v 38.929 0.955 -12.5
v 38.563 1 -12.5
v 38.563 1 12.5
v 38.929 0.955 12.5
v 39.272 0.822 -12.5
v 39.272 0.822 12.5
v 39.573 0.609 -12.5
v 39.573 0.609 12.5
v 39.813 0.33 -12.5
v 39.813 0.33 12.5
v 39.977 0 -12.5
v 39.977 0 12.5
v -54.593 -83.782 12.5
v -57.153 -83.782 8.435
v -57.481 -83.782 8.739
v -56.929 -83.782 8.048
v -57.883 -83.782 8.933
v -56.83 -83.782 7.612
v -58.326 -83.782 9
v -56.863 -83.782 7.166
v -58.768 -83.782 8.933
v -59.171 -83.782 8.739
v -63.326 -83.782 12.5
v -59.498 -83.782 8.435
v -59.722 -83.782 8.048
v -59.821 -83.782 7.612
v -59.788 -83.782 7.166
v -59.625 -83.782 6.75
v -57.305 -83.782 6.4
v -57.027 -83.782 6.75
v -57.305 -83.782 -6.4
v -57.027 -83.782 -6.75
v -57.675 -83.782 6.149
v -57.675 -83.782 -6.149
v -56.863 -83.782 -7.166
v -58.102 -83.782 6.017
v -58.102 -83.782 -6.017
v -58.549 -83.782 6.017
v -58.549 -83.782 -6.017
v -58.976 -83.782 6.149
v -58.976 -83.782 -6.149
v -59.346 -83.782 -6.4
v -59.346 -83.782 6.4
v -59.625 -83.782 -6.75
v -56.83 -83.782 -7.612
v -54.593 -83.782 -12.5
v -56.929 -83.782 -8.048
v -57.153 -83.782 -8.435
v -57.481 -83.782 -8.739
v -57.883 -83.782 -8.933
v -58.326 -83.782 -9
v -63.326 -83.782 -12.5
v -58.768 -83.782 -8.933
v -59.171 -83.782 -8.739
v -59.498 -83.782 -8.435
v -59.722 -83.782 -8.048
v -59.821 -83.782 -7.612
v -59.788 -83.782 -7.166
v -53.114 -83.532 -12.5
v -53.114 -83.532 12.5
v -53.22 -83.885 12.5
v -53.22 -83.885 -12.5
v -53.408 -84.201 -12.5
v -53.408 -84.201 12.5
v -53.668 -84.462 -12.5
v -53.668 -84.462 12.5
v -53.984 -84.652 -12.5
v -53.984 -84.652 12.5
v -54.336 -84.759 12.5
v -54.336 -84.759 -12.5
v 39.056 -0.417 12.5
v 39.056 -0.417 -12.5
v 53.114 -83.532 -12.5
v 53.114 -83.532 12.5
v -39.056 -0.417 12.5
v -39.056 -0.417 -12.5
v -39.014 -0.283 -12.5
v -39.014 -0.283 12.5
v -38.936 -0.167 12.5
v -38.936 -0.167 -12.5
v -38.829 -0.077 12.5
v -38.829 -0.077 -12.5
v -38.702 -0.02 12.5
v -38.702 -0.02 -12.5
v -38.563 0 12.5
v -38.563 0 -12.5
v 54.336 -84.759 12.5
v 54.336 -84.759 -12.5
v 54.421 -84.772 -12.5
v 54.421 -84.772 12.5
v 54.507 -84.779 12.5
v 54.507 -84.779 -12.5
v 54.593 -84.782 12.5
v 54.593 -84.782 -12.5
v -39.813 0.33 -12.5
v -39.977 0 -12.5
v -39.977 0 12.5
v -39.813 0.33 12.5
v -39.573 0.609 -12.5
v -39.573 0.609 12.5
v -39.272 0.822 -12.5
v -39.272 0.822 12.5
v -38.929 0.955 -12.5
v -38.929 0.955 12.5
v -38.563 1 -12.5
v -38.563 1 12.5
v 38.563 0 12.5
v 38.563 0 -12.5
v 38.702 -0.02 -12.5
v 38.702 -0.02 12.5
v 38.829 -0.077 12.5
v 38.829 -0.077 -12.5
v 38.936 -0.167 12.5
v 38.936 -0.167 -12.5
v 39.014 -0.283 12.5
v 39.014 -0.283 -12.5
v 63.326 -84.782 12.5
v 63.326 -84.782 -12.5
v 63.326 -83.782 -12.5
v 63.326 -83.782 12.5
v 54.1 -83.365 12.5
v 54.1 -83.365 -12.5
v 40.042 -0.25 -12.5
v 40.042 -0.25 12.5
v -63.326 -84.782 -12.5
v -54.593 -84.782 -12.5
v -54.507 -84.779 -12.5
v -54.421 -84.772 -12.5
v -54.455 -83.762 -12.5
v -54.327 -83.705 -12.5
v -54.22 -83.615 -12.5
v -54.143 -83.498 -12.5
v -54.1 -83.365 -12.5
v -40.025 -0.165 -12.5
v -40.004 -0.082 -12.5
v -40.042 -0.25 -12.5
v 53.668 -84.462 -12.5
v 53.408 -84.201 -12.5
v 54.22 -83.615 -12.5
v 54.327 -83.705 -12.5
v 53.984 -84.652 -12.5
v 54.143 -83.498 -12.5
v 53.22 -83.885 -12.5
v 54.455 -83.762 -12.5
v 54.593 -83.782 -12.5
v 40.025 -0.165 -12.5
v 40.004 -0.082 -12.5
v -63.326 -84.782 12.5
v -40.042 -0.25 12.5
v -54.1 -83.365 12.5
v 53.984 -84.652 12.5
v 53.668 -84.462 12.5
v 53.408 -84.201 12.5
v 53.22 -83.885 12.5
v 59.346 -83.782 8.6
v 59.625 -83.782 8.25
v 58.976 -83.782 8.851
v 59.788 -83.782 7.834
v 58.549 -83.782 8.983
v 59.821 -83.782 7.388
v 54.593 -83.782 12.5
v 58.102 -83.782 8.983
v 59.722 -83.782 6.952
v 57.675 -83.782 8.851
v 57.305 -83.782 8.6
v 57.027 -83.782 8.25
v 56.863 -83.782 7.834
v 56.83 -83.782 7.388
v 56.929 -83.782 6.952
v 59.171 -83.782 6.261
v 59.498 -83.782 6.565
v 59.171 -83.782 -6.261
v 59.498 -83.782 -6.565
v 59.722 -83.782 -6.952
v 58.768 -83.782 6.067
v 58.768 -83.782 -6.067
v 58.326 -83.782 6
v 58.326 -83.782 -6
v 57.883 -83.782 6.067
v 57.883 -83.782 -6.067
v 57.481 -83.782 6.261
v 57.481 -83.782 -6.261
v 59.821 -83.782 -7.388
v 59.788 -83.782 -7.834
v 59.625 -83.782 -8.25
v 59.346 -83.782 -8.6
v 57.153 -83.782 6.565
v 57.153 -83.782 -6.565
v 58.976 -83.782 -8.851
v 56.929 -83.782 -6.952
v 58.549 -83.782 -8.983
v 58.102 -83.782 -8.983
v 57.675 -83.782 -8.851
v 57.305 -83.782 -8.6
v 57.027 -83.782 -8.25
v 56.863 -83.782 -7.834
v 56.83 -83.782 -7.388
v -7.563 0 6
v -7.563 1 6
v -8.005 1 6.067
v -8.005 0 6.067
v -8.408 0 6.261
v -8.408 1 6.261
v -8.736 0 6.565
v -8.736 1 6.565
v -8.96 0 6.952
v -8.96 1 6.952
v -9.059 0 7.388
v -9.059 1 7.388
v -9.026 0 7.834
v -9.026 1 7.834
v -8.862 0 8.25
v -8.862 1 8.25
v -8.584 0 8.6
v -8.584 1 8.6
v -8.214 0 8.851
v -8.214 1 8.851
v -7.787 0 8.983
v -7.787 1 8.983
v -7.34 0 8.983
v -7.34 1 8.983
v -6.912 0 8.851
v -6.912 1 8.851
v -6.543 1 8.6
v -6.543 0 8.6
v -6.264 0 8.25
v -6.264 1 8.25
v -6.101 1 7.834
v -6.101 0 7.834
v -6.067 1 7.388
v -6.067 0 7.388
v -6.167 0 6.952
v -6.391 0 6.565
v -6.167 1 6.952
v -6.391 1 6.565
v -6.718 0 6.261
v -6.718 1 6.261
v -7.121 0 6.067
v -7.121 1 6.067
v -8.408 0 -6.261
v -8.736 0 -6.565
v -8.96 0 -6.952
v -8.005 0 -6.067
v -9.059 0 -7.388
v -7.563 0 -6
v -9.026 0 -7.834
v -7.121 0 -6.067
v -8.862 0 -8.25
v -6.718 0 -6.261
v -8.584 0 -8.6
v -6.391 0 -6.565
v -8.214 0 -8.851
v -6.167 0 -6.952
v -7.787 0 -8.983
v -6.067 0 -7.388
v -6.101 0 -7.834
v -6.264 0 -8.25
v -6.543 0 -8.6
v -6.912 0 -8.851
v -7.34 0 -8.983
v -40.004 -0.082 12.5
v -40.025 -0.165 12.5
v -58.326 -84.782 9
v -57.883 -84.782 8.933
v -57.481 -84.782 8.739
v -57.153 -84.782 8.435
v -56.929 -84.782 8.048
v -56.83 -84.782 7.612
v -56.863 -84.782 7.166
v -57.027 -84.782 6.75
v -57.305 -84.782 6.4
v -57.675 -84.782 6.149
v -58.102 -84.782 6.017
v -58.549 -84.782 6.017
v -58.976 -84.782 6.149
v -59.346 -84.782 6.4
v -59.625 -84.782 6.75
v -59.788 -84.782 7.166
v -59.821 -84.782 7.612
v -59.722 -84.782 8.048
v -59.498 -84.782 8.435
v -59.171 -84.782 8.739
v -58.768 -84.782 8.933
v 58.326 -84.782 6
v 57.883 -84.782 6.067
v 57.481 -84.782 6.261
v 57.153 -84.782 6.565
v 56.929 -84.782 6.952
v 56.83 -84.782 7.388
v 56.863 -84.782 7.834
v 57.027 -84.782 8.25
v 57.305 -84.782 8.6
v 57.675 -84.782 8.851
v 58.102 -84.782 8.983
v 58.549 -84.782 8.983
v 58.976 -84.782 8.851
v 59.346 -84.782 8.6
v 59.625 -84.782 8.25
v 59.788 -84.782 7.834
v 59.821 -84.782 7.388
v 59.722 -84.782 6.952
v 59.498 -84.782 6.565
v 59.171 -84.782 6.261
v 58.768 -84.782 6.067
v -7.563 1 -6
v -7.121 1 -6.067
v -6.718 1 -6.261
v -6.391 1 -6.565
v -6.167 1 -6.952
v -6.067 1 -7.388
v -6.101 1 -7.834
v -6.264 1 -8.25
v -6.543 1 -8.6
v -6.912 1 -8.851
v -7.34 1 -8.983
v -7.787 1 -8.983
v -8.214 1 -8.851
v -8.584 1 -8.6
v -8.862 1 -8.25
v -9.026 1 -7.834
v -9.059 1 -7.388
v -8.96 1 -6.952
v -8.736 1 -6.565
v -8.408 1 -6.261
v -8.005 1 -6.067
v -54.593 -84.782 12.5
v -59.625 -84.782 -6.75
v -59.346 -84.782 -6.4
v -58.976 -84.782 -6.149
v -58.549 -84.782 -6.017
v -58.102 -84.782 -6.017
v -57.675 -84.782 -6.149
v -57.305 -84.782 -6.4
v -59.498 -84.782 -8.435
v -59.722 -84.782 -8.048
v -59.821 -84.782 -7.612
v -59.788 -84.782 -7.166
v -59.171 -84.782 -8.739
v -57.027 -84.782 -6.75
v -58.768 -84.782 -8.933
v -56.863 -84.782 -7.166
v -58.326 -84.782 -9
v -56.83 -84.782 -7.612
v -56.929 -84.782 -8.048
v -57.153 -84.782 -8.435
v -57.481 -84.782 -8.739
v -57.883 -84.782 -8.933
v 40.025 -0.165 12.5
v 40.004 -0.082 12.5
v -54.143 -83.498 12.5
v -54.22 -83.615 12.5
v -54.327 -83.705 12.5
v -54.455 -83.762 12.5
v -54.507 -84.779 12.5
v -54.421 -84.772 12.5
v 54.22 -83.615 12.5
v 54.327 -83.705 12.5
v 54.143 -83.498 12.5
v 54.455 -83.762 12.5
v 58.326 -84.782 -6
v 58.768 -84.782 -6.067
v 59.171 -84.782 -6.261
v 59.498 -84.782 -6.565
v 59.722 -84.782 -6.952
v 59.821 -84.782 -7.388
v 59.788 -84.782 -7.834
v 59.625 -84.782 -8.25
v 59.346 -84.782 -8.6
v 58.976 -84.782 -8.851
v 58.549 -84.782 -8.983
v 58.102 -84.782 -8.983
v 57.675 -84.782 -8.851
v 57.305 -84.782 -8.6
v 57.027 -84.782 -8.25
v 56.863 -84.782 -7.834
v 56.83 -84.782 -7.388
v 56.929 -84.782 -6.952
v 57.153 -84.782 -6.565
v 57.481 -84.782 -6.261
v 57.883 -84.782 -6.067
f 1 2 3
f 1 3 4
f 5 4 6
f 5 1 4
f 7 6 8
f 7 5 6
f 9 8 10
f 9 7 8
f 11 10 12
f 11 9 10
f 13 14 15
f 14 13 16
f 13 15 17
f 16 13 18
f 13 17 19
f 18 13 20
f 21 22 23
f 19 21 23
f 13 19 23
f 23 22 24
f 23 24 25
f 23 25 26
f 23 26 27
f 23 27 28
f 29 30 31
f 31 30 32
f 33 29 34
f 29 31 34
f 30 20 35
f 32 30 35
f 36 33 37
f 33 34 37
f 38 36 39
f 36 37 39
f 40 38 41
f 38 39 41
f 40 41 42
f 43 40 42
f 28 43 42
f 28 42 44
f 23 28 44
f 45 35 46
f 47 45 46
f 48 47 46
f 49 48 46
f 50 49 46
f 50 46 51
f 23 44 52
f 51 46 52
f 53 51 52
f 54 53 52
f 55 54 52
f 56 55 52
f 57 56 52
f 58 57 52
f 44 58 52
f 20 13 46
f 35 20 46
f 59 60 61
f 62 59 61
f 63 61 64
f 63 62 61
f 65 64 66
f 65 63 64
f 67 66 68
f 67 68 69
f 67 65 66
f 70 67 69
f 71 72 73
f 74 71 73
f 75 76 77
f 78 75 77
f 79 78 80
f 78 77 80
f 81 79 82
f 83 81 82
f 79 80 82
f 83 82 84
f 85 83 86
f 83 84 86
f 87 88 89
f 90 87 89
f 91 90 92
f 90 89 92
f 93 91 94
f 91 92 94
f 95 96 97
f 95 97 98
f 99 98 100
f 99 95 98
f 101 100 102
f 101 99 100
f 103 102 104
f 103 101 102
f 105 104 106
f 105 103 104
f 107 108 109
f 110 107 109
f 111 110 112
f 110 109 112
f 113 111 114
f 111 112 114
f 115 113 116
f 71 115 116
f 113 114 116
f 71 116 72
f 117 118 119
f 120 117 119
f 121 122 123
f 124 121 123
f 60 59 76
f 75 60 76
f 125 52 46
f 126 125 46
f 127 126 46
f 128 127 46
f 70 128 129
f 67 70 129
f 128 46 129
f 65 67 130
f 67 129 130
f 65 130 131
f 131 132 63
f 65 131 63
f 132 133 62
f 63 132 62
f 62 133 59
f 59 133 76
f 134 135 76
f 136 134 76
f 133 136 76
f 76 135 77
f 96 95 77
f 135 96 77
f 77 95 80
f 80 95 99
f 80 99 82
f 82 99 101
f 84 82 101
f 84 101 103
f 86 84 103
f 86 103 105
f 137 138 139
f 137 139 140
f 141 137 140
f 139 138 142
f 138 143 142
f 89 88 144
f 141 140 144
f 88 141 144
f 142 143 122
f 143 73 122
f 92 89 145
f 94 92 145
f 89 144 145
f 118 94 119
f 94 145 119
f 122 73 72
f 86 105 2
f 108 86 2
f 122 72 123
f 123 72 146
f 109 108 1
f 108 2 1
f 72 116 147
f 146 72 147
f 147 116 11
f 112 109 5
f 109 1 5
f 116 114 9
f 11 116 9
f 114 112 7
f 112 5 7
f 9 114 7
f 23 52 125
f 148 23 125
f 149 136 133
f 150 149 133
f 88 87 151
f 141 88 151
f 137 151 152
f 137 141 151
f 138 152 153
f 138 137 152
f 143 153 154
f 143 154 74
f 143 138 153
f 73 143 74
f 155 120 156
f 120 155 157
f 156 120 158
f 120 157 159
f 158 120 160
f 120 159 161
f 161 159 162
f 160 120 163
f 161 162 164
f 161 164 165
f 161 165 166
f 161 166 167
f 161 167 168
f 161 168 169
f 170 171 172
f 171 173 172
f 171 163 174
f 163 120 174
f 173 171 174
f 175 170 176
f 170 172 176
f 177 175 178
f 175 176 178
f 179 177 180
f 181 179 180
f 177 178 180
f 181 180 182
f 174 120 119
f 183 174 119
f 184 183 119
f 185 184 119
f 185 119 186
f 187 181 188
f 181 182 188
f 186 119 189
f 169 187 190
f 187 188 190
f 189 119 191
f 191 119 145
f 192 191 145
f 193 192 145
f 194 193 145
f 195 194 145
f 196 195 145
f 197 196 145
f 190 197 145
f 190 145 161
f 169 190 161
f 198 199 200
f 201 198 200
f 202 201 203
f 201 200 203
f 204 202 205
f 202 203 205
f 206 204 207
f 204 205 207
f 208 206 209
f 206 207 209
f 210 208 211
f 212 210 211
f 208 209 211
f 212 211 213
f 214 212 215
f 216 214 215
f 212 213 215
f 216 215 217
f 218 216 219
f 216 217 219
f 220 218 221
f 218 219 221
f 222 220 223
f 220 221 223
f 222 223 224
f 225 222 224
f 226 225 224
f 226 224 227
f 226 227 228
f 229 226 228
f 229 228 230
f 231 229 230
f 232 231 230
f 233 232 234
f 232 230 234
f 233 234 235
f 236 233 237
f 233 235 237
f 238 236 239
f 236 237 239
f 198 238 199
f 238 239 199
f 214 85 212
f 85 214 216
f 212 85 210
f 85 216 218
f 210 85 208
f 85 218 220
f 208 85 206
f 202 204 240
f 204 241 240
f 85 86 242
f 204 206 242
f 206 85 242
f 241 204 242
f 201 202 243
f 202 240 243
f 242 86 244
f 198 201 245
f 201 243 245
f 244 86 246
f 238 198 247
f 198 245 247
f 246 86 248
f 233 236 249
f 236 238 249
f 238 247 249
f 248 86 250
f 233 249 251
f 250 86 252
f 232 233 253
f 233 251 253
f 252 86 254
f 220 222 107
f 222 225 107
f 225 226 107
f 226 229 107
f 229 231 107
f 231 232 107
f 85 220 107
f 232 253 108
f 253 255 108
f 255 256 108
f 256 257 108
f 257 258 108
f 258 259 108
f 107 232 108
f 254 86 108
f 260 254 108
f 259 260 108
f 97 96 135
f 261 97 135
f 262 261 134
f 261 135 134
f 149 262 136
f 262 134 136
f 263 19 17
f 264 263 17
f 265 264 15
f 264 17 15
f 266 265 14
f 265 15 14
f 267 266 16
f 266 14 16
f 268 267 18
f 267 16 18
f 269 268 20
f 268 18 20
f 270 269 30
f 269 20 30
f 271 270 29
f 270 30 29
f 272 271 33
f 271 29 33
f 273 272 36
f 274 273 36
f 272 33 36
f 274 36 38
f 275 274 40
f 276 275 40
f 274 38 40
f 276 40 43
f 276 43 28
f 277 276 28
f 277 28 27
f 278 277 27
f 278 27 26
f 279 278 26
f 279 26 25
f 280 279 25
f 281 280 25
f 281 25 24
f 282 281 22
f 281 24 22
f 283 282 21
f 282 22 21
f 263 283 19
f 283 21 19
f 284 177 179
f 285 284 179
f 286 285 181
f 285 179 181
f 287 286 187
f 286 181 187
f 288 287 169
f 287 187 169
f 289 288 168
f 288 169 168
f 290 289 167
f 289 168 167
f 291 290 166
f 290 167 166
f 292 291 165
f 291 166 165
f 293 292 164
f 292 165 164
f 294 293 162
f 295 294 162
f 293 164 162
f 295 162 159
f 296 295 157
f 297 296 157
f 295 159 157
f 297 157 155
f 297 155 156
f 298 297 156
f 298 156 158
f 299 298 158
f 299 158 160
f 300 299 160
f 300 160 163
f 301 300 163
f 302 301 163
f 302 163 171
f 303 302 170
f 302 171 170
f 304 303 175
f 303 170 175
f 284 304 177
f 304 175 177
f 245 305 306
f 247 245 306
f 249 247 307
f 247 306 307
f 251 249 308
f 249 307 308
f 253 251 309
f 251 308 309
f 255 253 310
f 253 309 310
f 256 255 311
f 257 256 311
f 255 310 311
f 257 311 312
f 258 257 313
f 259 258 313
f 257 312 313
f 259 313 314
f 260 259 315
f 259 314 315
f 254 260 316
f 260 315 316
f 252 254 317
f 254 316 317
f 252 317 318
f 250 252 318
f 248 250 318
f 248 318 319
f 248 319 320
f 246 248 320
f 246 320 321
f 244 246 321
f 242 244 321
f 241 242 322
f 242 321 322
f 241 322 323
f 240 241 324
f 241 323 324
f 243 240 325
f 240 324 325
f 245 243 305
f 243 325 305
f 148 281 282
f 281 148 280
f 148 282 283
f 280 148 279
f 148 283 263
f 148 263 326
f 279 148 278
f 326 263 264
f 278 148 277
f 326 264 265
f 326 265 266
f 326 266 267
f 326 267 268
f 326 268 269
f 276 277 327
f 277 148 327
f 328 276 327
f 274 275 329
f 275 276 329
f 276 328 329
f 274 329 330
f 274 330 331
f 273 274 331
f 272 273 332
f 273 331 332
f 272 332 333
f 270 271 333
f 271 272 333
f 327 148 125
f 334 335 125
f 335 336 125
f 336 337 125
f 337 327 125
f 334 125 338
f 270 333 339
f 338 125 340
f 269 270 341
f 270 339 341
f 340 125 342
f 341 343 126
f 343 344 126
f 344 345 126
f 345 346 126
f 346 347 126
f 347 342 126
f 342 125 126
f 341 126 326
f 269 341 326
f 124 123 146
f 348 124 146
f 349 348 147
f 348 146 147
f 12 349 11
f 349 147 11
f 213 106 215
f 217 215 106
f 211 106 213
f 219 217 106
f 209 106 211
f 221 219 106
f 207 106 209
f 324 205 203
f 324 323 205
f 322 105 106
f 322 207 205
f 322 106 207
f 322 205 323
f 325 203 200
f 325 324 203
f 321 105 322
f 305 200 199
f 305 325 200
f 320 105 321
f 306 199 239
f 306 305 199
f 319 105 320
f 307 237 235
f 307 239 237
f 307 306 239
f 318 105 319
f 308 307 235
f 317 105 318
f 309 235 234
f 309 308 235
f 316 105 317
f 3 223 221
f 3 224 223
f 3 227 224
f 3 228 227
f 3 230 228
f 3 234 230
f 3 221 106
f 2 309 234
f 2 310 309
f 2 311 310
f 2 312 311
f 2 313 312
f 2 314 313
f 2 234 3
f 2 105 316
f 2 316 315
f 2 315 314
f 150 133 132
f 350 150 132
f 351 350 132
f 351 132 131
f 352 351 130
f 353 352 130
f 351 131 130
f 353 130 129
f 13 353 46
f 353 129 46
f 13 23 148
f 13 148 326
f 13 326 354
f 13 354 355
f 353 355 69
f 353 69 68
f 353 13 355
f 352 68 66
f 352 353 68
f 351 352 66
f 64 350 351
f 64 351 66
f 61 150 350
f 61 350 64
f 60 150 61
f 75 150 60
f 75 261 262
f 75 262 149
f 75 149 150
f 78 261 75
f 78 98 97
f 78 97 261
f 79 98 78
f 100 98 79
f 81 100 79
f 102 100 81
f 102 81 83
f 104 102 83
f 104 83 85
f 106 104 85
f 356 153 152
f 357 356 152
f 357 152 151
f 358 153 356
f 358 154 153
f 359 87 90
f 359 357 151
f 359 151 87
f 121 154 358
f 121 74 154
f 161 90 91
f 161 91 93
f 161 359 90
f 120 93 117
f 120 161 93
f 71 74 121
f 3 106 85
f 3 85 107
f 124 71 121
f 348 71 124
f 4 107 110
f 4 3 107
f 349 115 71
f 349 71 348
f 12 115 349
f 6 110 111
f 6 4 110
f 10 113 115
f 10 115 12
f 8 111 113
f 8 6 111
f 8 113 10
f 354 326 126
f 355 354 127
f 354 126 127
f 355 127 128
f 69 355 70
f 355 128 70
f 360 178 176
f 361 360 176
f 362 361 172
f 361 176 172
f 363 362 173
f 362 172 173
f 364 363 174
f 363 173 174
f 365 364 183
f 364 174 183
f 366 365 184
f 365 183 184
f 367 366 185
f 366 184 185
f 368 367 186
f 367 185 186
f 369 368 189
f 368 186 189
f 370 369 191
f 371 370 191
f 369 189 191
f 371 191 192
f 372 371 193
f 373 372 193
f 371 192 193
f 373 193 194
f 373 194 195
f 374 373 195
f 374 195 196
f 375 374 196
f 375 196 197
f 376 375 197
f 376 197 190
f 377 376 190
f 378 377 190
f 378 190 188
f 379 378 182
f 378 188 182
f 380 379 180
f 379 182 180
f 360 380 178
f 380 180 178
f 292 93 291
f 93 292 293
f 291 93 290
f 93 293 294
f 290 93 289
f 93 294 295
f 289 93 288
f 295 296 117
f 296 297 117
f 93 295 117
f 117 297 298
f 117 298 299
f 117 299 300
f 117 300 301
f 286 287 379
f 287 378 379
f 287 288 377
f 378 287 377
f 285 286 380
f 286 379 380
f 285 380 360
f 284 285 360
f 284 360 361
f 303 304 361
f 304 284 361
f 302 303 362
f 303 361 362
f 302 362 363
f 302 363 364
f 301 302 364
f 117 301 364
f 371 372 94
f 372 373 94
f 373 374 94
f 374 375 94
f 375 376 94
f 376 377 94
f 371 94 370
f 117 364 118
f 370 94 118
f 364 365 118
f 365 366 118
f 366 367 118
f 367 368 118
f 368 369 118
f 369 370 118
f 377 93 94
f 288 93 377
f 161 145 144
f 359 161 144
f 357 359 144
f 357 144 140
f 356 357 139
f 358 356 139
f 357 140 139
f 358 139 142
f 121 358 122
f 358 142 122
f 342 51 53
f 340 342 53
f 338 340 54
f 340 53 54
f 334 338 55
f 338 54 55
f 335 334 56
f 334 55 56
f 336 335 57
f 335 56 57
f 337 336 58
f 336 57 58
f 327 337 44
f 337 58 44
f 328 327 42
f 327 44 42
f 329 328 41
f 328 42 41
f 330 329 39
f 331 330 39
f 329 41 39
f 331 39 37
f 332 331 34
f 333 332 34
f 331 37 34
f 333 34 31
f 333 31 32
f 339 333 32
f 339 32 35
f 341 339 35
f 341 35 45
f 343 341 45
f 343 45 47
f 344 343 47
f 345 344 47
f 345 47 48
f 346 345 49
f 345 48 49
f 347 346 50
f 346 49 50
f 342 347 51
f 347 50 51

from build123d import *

# Parameters (mm, degrees)
SKETCH_1_W               = 80
SKETCH_1_H               = 25
EXTRUDE_1_DEPTH          = 1
SM_START                 = -12.5
SM_EDGE_FLANGE_1_DEPTH   = 25
SM_EDGE_FLANGE_1_2_DEPTH = 25
SM_EDGE_FLANGE_2_DEPTH   = 25
SM_EDGE_FLANGE_2_2_DEPTH = 25
SKETCH_18_R              = 1.5
CUT_EXTRUDE_1_DEPTH      = 1
SKETCH_19_R              = 1.5
CUT_EXTRUDE_2_DEPTH      = 1


# Read off the part's stored shape, not the designer's step: Ребро-кромка1, Ребро-кромка2
with BuildPart() as part:
    # Sketch 1 → Бобышка-Вытянуть1 (new body)
    with BuildSketch(Plane(origin=(0, 0, 0), x_dir=(1, 0, 0), z_dir=(0, 1, 0))):
        Rectangle(SKETCH_1_W, SKETCH_1_H)
    extrude(amount=EXTRUDE_1_DEPTH)

    # Ребро-кромка1 outline → Ребро-кромка1 (cut)
    with BuildSketch(Plane.XY.offset(SM_START)):
        with BuildLine():
            Line((-40, 0), (-39.977477944, 0))
            ThreePointArc((-39.977477944, 0), (-39.429289785, 0.724744872), (-38.563264381, 1))
            Line((-38.563264381, 1), (-40, 1))
            Line((-40, 1), (-40, 0))
        make_face()
        with BuildLine():
            Line((40, 1), (38.563264381, 1))
            ThreePointArc((38.563264381, 1), (39.429289785, 0.724744872), (39.977477944, 0))
            Line((39.977477944, 0), (40, 0))
            Line((40, 0), (40, 1))
        make_face()
    extrude(amount=SM_EDGE_FLANGE_1_DEPTH, mode=Mode.SUBTRACT)

    # Sm Edge Flange 1 2 outline → Sm Edge Flange 1 2 (add)
    with BuildSketch(Plane.XY.offset(SM_START)):
        with BuildLine():
            ThreePointArc((-39.977477944, 0), (-40.015252138, -0.123527486), (-40.042258437, -0.24984688))
            Line((-40.042258437, -0.24984688), (-54.339743625, -84.781655225))
            Line((-54.339743625, -84.781655225), (-53.353747587, -84.948423972))
            Line((-53.353747587, -84.948423972), (-39.0562624, -0.416615627))
            ThreePointArc((-39.0562624, -0.416615627), (-38.885993225, -0.118101986), (-38.563264381, 0))
            Line((-38.563264381, 0), (-39.977477944, 0))
        make_face()
        with BuildLine():
            Line((39.977477944, 0), (38.563264381, 0))
            ThreePointArc((38.563264381, 0), (38.885993225, -0.118101986), (39.0562624, -0.416615627))
            Line((39.0562624, -0.416615627), (53.353747587, -84.948423972))
            Line((53.353747587, -84.948423972), (54.339743625, -84.781655225))
            Line((54.339743625, -84.781655225), (40.042258437, -0.24984688))
            ThreePointArc((40.042258437, -0.24984688), (40.015252138, -0.123527486), (39.977477944, 0))
        make_face()
    extrude(amount=SM_EDGE_FLANGE_1_2_DEPTH)

    # Ребро-кромка2 outline → Ребро-кромка2 (cut)
    with BuildSketch(Plane.XY.offset(SM_START)):
        with BuildLine():
            Line((54.339743625, -84.781655225), (54.33598765, -84.759448567))
            ThreePointArc((54.33598765, -84.759448567), (53.529971426, -84.339802009), (53.114144989, -83.531808345))
            Line((53.114144989, -83.531808345), (53.353747587, -84.948423972))
            Line((53.353747587, -84.948423972), (54.339743625, -84.781655225))
        make_face()
        with BuildLine():
            ThreePointArc((-53.114144989, -83.531808345), (-53.529971426, -84.339802009), (-54.33598765, -84.759448567))
            Line((-54.33598765, -84.759448567), (-54.339743625, -84.781655225))
            Line((-54.339743625, -84.781655225), (-53.353747587, -84.948423972))
            Line((-53.353747587, -84.948423972), (-53.114144989, -83.531808345))
        make_face()
    extrude(amount=SM_EDGE_FLANGE_2_DEPTH, mode=Mode.SUBTRACT)

    # Sm Edge Flange 2 2 outline → Sm Edge Flange 2 2 (add)
    with BuildSketch(Plane.XY.offset(SM_START)):
        with BuildLine():
            ThreePointArc((54.33598765, -84.759448567), (54.464084816, -84.776093249), (54.593139045, -84.781655225))
            Line((54.593139045, -84.781655225), (63.325540765, -84.781655225))
            Line((63.325540765, -84.781655225), (63.325540765, -83.781655225))
            Line((63.325540765, -83.781655225), (54.593139045, -83.781655225))
            ThreePointArc((54.593139045, -83.781655225), (54.270410201, -83.663553239), (54.100141026, -83.365039598))
            Line((54.100141026, -83.365039598), (54.33598765, -84.759448567))
        make_face()
        with BuildLine():
            Line((-63.325540765, -83.781655225), (-63.325540765, -84.781655225))
            Line((-63.325540765, -84.781655225), (-54.593139045, -84.781655225))
            ThreePointArc((-54.593139045, -84.781655225), (-54.464084816, -84.776093249), (-54.33598765, -84.759448567))
            Line((-54.33598765, -84.759448567), (-54.100141026, -83.365039598))
            ThreePointArc((-54.100141026, -83.365039598), (-54.270410201, -83.663553239), (-54.593139045, -83.781655225))
            Line((-54.593139045, -83.781655225), (-63.325540765, -83.781655225))
        make_face()
    extrude(amount=SM_EDGE_FLANGE_2_2_DEPTH)

    # Эскиз18 → Вырез-Вытянуть1 (cut)
    with BuildSketch(Plane(origin=(0, 1, 0), x_dir=(1, 0, 0), z_dir=(0, 1, 0))):
        with Locations(Location((-7.563264381, 7.5, 0), (0, 0, 270))):
            Circle(SKETCH_18_R)
        with Locations(Location((-7.563264381, -7.5, 0), (0, 0, 90))):
            Circle(SKETCH_18_R)
    extrude(amount=-CUT_EXTRUDE_1_DEPTH, mode=Mode.SUBTRACT)

    # Эскиз19 → Вырез-Вытянуть2 (cut)
    with BuildSketch(Plane(origin=(0, -83.781655225, 0), x_dir=(1, 0, 0), z_dir=(0, 1, 0))):
        with Locations(Location((58.325540765, 7.5, 0), (0, 0, 270))):
            Circle(SKETCH_19_R)
        with Locations(Location((58.325540765, -7.5, 0), (0, 0, 90))):
            Circle(SKETCH_19_R)
        with Locations(Location((-58.325540765, -7.5, 0), (0, 0, 270))):
            Circle(SKETCH_19_R)
        with Locations(Location((-58.325540765, 7.5, 0), (0, 0, 90))):
            Circle(SKETCH_19_R)
    extrude(amount=-CUT_EXTRUDE_2_DEPTH, mode=Mode.SUBTRACT)


solid = part.part
